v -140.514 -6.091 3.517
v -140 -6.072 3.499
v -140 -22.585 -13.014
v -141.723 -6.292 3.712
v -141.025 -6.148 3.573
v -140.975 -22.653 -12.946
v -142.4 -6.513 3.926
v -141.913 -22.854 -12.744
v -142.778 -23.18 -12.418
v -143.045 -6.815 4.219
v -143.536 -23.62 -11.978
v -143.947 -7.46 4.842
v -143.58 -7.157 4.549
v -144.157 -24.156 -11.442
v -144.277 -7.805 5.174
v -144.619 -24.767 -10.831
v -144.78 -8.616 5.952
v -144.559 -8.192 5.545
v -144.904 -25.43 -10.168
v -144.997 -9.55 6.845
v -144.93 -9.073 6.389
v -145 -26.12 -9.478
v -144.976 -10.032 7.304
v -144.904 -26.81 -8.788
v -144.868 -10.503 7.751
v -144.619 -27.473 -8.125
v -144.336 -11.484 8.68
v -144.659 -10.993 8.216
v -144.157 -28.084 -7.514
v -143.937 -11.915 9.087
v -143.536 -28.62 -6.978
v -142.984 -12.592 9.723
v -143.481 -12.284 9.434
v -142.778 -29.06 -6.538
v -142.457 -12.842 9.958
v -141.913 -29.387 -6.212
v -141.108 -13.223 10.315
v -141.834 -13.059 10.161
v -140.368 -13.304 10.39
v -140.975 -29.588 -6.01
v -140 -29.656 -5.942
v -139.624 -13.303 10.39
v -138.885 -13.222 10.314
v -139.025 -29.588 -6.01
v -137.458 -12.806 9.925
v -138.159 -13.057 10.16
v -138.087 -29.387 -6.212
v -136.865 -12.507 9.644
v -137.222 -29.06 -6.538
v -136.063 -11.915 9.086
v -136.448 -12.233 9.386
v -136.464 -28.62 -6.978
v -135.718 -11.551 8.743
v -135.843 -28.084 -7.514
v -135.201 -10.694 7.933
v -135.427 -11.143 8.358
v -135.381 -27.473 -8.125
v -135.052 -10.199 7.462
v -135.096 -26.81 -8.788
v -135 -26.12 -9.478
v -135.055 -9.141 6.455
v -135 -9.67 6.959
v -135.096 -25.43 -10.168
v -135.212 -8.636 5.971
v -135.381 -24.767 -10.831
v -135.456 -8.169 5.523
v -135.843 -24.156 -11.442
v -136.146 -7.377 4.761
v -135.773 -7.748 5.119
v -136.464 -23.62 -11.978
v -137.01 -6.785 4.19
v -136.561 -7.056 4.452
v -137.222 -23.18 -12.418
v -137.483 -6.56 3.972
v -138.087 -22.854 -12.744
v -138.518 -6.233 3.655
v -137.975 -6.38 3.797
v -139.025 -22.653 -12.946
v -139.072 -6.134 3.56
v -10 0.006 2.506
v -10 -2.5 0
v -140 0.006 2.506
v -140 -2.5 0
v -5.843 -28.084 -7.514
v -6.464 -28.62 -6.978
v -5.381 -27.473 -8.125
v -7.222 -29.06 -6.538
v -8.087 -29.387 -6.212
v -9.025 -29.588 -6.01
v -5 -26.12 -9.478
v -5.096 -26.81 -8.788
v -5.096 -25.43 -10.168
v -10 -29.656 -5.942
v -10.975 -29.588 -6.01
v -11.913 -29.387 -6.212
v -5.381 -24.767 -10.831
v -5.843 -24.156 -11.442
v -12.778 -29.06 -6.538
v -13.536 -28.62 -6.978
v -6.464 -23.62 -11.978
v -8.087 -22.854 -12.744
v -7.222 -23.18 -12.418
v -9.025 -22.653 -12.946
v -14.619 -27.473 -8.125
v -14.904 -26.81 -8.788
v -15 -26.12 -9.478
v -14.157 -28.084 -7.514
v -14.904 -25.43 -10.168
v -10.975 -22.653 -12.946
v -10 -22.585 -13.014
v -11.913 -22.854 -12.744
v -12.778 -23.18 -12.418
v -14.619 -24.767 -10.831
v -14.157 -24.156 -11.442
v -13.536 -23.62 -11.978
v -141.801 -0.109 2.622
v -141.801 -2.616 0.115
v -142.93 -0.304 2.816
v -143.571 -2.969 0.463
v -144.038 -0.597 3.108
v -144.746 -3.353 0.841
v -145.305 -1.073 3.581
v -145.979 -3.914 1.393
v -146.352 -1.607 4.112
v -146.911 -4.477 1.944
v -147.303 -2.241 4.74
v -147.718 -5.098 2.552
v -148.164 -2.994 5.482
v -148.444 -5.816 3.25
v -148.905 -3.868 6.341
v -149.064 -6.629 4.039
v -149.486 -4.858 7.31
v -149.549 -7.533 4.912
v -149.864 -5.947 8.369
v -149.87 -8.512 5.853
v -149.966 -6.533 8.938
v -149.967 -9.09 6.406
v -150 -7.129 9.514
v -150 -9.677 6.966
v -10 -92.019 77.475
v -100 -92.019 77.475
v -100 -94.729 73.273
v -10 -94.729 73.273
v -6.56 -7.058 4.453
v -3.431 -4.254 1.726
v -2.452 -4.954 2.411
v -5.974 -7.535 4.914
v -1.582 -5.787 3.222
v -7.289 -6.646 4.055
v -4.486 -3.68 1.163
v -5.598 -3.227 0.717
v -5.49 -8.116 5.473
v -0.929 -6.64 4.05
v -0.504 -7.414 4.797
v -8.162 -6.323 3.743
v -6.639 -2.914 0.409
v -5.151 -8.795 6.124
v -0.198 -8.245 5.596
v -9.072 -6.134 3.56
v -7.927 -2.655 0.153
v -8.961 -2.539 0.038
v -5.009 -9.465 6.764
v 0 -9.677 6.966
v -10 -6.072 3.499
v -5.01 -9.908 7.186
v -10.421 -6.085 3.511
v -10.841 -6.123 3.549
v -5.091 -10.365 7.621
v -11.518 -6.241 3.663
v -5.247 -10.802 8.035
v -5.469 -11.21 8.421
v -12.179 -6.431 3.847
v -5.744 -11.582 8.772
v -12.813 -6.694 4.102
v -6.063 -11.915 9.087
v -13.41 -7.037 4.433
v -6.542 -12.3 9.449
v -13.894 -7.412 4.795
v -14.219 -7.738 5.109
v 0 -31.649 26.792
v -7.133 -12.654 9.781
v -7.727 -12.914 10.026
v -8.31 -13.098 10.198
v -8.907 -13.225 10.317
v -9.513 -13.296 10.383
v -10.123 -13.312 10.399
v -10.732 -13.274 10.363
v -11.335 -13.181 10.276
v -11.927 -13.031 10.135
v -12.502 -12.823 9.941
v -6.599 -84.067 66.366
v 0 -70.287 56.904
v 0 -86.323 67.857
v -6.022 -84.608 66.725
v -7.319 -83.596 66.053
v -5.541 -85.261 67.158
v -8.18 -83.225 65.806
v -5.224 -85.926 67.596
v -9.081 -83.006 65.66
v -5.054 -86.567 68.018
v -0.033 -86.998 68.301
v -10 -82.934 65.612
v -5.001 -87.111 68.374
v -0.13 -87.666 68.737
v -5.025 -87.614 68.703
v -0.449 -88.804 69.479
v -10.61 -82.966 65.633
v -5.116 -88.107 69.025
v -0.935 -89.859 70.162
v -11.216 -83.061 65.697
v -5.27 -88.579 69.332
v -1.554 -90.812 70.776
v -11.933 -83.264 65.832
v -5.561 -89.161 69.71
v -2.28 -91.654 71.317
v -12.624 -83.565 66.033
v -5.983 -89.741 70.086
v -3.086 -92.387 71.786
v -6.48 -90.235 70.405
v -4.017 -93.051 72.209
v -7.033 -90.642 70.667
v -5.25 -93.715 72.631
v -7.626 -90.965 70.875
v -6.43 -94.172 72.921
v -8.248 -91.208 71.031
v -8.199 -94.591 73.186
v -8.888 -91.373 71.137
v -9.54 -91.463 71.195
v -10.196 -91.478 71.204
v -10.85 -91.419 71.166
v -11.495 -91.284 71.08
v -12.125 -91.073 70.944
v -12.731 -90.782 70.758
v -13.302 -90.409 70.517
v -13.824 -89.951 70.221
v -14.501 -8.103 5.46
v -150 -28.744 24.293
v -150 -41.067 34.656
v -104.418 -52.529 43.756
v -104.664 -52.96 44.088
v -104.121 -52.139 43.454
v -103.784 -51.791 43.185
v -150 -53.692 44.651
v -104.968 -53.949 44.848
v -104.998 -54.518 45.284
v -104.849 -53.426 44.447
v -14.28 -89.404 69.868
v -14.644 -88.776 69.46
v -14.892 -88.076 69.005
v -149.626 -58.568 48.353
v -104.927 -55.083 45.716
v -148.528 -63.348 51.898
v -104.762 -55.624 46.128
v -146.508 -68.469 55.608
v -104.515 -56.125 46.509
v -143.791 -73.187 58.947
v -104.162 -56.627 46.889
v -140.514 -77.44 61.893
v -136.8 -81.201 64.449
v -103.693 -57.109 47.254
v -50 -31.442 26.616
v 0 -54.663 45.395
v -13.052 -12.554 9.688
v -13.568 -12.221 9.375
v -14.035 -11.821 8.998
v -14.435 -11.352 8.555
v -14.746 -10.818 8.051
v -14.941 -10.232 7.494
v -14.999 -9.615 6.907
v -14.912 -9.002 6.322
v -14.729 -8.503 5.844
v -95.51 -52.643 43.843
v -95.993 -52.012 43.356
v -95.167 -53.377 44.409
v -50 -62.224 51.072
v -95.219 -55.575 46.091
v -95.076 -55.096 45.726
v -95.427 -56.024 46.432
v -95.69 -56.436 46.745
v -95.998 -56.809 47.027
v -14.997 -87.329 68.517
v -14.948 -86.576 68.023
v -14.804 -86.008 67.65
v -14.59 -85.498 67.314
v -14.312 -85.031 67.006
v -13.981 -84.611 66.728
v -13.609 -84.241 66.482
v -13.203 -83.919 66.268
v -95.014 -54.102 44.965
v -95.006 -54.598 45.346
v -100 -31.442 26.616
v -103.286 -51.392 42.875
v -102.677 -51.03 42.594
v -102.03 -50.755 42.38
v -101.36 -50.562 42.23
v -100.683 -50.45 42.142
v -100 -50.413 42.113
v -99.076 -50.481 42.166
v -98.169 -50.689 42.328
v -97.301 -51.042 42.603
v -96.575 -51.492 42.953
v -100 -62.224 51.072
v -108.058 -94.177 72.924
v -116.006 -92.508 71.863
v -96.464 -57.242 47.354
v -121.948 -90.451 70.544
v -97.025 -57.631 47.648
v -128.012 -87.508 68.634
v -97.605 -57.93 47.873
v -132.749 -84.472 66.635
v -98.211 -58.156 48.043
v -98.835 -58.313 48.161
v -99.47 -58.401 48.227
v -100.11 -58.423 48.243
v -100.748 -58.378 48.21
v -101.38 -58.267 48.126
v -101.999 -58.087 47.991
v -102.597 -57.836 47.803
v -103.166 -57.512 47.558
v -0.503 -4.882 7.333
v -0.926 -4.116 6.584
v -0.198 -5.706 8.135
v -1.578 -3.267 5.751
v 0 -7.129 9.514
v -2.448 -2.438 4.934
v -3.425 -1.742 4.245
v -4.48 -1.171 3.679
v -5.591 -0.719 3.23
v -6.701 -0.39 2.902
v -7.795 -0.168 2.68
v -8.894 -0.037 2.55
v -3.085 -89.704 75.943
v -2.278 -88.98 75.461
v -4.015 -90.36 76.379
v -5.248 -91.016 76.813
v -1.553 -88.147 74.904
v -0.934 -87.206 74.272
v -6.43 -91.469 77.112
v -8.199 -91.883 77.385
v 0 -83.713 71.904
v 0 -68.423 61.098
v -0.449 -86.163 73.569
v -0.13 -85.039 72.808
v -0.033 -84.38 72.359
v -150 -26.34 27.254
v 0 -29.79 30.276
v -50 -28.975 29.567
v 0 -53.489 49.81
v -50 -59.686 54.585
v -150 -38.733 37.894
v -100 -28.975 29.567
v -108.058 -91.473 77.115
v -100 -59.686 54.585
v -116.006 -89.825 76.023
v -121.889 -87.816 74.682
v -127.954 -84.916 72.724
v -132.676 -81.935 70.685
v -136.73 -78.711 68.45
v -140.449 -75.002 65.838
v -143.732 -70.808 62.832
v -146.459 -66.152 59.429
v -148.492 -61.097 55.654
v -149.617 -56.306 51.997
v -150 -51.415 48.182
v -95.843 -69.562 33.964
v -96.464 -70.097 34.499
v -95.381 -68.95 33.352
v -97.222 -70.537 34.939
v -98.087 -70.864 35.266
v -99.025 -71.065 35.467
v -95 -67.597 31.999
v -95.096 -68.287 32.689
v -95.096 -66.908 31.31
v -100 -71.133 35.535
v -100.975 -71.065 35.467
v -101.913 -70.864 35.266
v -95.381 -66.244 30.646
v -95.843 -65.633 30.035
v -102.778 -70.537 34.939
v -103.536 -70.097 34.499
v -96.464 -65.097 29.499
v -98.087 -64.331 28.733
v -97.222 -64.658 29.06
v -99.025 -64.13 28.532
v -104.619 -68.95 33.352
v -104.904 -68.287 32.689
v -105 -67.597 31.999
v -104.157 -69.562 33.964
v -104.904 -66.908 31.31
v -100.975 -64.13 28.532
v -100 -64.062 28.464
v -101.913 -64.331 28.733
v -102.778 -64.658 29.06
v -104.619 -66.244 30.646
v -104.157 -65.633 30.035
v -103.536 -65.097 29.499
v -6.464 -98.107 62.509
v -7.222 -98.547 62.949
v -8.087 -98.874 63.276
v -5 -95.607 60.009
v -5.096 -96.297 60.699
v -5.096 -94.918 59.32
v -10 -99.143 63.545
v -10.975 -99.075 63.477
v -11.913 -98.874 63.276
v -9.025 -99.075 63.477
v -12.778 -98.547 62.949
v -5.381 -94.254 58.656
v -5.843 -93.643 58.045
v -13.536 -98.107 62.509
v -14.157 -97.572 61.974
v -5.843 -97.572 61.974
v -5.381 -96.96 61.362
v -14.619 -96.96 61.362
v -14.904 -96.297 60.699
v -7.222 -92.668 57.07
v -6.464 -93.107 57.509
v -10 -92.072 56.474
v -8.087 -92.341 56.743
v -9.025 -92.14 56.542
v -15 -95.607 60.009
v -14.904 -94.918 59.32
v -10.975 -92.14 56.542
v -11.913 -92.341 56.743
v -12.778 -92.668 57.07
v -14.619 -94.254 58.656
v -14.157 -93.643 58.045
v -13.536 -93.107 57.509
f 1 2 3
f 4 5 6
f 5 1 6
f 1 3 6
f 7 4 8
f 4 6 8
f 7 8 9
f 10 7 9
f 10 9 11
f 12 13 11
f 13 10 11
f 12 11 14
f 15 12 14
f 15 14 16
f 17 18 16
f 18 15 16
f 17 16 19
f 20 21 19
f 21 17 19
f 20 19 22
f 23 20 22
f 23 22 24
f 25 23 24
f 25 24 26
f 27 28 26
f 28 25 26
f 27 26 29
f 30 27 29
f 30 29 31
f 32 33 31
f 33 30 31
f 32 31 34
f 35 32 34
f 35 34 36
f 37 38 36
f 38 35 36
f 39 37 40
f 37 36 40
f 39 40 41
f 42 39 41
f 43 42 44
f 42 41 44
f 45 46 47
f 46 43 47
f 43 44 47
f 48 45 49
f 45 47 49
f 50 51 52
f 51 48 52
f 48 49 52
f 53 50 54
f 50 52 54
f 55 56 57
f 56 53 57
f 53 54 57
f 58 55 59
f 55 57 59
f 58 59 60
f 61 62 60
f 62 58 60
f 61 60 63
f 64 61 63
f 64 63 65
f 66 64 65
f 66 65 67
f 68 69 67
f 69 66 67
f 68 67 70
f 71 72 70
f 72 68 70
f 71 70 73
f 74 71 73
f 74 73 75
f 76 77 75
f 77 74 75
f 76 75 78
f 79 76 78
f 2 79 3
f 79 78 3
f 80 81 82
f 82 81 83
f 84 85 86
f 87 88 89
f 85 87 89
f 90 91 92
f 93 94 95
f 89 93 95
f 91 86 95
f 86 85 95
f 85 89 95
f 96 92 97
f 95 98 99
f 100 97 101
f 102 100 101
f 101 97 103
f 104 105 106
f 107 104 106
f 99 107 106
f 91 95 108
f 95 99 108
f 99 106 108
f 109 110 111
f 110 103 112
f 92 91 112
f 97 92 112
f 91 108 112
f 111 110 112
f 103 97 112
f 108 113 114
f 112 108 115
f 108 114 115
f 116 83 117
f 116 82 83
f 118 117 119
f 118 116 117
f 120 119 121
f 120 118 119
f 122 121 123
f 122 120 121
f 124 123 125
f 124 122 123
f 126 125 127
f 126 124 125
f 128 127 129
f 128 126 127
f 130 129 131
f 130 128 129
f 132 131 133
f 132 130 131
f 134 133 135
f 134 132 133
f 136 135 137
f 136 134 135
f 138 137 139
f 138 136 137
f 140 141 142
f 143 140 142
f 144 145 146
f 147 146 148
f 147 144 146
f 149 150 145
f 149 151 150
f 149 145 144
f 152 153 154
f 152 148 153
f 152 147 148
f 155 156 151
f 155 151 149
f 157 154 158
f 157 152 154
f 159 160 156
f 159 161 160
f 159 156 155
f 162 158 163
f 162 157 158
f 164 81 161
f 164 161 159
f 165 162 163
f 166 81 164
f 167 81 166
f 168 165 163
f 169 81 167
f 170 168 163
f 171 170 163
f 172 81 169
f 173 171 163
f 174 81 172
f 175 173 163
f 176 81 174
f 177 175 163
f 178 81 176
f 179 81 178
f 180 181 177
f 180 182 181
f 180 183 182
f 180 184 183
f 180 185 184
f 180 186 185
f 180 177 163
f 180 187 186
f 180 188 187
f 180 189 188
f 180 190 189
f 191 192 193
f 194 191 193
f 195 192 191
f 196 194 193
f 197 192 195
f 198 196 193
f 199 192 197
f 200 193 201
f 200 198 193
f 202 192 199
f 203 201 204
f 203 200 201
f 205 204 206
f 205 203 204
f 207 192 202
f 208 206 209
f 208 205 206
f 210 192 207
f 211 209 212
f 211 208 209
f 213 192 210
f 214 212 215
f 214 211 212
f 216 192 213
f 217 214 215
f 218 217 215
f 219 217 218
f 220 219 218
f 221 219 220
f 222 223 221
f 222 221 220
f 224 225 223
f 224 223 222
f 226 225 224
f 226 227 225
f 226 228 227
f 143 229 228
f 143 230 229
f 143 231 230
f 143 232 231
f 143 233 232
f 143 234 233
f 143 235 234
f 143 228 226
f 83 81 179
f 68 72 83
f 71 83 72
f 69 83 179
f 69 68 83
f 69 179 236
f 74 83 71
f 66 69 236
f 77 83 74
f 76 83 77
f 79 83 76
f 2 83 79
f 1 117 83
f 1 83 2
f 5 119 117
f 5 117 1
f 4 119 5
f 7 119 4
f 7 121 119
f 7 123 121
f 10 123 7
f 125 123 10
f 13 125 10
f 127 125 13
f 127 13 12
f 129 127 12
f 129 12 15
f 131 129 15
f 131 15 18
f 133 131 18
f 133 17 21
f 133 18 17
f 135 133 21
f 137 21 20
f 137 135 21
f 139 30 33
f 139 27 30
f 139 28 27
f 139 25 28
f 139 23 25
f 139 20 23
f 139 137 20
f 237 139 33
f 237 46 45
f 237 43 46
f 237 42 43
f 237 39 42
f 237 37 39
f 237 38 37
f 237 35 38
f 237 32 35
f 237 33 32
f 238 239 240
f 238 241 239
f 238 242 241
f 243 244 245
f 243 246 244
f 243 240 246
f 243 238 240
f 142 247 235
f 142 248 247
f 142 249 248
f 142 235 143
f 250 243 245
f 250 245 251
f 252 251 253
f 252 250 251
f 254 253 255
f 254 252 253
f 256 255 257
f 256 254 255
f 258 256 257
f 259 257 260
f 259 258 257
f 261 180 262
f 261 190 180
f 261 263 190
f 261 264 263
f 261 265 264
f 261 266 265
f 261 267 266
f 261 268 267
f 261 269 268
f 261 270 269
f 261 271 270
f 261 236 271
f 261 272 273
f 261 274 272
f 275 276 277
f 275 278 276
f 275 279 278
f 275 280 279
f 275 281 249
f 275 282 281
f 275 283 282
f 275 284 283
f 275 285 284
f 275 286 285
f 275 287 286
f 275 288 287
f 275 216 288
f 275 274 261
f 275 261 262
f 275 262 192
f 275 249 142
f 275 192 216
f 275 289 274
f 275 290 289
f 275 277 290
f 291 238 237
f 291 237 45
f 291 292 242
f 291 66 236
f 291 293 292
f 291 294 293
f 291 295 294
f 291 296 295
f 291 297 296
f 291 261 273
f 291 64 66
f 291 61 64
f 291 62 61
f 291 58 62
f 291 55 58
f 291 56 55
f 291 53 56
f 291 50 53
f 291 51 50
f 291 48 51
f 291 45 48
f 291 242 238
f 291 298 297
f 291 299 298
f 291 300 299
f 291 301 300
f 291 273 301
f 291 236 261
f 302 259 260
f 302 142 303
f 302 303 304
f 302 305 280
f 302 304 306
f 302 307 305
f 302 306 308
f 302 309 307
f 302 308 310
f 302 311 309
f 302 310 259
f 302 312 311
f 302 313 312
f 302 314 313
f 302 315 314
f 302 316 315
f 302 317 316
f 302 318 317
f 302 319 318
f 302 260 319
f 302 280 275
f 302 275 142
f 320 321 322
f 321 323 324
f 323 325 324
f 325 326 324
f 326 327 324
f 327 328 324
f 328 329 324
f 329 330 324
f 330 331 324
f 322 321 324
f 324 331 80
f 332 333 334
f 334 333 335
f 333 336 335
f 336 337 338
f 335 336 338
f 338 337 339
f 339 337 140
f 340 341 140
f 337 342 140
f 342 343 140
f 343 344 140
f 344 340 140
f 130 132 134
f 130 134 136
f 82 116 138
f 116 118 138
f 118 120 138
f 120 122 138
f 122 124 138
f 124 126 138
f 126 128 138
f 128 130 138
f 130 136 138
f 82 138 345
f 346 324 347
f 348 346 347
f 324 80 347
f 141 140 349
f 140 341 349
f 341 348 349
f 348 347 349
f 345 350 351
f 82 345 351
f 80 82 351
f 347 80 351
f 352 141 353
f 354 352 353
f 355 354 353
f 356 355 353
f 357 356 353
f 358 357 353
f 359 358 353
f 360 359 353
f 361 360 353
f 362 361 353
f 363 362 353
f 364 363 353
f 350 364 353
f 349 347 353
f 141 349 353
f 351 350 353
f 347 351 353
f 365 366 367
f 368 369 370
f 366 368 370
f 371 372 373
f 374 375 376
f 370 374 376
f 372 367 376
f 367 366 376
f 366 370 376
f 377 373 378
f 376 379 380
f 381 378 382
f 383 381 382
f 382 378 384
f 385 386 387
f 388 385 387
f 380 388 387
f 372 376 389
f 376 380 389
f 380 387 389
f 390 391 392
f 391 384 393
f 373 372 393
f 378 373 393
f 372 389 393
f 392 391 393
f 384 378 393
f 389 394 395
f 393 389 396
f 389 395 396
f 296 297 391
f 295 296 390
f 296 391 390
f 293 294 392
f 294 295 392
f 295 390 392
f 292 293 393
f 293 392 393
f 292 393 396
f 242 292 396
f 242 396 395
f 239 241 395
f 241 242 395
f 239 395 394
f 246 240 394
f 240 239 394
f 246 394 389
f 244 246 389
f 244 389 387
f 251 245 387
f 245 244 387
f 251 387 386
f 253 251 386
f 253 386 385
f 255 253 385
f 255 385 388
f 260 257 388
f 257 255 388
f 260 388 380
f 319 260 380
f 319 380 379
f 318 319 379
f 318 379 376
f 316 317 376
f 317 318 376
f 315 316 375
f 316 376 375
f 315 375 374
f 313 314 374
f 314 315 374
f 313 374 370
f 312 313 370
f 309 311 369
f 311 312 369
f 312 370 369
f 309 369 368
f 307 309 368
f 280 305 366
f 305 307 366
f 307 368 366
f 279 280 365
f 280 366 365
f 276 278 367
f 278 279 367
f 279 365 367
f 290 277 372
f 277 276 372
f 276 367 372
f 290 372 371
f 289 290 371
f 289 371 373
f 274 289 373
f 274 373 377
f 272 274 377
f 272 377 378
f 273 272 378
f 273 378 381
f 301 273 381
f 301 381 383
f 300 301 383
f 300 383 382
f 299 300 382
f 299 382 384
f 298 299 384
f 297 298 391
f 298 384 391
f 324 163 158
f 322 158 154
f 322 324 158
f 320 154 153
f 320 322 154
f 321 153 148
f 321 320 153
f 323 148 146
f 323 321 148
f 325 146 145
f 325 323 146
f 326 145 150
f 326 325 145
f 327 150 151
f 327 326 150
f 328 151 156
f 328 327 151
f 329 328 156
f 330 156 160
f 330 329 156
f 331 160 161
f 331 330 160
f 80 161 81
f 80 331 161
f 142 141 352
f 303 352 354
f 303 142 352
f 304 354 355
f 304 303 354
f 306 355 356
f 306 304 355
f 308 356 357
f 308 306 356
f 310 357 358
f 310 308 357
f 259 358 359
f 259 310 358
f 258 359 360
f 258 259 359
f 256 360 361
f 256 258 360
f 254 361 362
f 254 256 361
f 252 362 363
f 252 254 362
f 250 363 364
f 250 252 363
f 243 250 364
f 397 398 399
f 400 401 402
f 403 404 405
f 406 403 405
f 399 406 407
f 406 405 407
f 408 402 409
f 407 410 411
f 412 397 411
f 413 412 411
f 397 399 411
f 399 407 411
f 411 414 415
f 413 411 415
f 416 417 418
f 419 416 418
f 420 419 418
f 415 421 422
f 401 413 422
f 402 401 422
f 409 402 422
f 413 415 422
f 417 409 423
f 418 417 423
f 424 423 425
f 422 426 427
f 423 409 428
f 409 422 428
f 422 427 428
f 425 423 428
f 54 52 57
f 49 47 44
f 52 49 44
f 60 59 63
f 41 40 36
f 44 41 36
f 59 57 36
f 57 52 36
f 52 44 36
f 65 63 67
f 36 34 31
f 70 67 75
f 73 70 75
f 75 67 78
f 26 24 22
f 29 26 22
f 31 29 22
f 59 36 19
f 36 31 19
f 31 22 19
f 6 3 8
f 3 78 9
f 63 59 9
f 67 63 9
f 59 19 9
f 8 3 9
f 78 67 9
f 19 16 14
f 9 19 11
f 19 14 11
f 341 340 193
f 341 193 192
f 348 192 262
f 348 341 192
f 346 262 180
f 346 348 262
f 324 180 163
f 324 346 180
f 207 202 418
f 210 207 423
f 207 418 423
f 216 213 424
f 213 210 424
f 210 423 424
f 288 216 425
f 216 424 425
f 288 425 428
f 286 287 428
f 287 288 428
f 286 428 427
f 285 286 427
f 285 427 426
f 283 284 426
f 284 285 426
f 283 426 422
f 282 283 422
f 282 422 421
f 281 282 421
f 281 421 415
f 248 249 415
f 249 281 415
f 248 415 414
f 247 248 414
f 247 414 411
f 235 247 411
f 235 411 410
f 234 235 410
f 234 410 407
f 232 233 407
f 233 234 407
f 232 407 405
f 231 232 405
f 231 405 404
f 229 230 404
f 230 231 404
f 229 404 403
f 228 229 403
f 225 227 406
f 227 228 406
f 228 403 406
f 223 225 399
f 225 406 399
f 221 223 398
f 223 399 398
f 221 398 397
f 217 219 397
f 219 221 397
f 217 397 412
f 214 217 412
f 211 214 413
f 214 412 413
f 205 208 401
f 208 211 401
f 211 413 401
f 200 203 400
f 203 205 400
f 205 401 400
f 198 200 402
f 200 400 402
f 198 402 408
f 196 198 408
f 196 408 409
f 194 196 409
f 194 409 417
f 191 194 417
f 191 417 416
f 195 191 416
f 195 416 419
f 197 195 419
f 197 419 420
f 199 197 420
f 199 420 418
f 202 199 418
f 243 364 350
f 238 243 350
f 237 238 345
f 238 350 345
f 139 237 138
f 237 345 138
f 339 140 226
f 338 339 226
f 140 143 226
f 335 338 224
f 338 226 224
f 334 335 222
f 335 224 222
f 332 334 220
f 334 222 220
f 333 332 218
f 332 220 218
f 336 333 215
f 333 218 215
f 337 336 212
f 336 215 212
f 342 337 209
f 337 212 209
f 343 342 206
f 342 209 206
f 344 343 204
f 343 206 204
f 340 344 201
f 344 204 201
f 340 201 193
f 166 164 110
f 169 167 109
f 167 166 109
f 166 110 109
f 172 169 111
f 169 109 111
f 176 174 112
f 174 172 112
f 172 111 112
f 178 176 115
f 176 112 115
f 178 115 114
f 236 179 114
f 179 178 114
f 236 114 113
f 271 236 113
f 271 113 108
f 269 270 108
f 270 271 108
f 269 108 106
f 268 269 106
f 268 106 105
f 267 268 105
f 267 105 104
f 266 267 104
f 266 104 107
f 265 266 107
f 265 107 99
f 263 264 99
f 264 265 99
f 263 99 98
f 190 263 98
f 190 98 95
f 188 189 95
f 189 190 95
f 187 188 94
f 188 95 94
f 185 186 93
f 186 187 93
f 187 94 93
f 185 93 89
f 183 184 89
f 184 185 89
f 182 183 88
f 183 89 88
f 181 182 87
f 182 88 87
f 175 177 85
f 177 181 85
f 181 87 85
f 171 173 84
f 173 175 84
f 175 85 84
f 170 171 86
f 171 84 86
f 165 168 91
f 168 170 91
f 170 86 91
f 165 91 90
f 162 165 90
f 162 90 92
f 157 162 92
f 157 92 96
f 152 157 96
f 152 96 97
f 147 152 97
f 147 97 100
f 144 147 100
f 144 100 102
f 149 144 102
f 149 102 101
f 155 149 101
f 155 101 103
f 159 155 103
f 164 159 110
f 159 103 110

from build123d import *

# Parameters (mm, degrees)
LOFT_START          = -150
LOFT_18_DEPTH       = 150
FILLET_1_R          = 50
SKETCH_8_W          = 150
SKETCH_8_H          = 89.90044461
CUT_EXTRUDE_3_DEPTH = 194.637322649
FILLET_3_R          = 10
EXTRUDE_1_REACH     = 195.637
SKETCH_5_R          = 5


# Read off the part's stored shape, not the designer's step: 放样18
with BuildPart() as part:
    # 放样18 outline → 放样18 (new body)
    with BuildSketch(Plane.YZ.offset(LOFT_START)):
        with BuildLine():
            Line((-92.019059125, 77.475043518), (-94.7292742, 73.273289807))
            add(Edge.make_bspline(
                [(-2.5, 0), (-30.482362978, 27.663701514), (-61.402130233, 52.230749004), (-94.7292742, 73.273289807)],
                knots=[0, 0, 0, 0, 1, 1, 1, 1], degree=3))
            Line((-2.5, 0), (2.5, 0))
            add(Edge.make_bspline(
                [(2.5, 0), (-26.24562462, 29.064286084), (-57.928653516, 55.031918144), (-92.019059125, 77.475043518)],
                knots=[0, 0, 0, 0, 1, 1, 1, 1], degree=3))
        make_face()
    extrude(amount=LOFT_18_DEPTH)

    # 圆角1
    fillet_1_edges = [part.edges().sort_by_distance(p)[0] for p in [
        (-150, -93.374166663, 75.374166663),
    ]]
    fillet(fillet_1_edges, radius=FILLET_1_R)

    # 草图8 → 切除-拉伸3 (cut, through all)
    with BuildSketch(Plane(origin=(0, -17.799060008, -17.799060008), x_dir=(-1, 0, 0), z_dir=(0, 0.7071067811865488, 0.7071067811865464))):
        with Locations((75, -43.182455352)):
            Rectangle(SKETCH_8_W, SKETCH_8_H)
    extrude(amount=CUT_EXTRUDE_3_DEPTH, mode=Mode.SUBTRACT)

    # 圆角3
    fillet_3_edges = [part.edges().sort_by_distance(p)[0] for p in [
        (0, -93.374166663, 75.374166663),
        (0, -1.246870677, 1.253129323),
        (-150, -1.246870677, 1.253129323),
    ]]
    fillet(fillet_3_edges, radius=FILLET_3_R)

    # 草图5 → 凸台-拉伸1 (add, up to next)
    with BuildSketch(Plane(origin=(0, -17.799060008, -17.799060008), x_dir=(-1, 0, 0), z_dir=(0, 0.7071067811865488, 0.7071067811865464)), mode=Mode.PRIVATE) as extrude_1_sk1:
        with Locations(Location((140, 11.767766953, 0), (0, 0, 270))):
            Circle(SKETCH_5_R)
    extrude_1_tool1 = extrude(extrude_1_sk1.sketch, amount=EXTRUDE_1_REACH, mode=Mode.PRIVATE) - part.part
    # 草图5 → 凸台-拉伸1 (add, up to next)
    with BuildSketch(Plane(origin=(0, -17.799060008, -17.799060008), x_dir=(-1, 0, 0), z_dir=(0, 0.7071067811865488, 0.7071067811865464)), mode=Mode.PRIVATE) as extrude_1_sk2:
        with Locations(Location((10, 11.767766953, 0), (0, 0, 270))):
            Circle(SKETCH_5_R)
    extrude_1_tool2 = extrude(extrude_1_sk2.sketch, amount=EXTRUDE_1_REACH, mode=Mode.PRIVATE) - part.part
    # 草图5 → 凸台-拉伸1 (add, up to next)
    with BuildSketch(Plane(origin=(0, -17.799060008, -17.799060008), x_dir=(-1, 0, 0), z_dir=(0, 0.7071067811865488, 0.7071067811865464)), mode=Mode.PRIVATE) as extrude_1_sk3:
        with Locations(Location((10, 110.037688609, 0), (0, 0, 270))):
            Circle(SKETCH_5_R)
    extrude_1_tool3 = extrude(extrude_1_sk3.sketch, amount=EXTRUDE_1_REACH, mode=Mode.PRIVATE) - part.part
    # 草图5 → 凸台-拉伸1 (add, up to next)
    with BuildSketch(Plane(origin=(0, -17.799060008, -17.799060008), x_dir=(-1, 0, 0), z_dir=(0, 0.7071067811865488, 0.7071067811865464)), mode=Mode.PRIVATE) as extrude_1_sk4:
        with Locations(Location((100, 70.425532461, 0), (0, 0, 270))):
            Circle(SKETCH_5_R)
    extrude_1_tool4 = extrude(extrude_1_sk4.sketch, amount=EXTRUDE_1_REACH, mode=Mode.PRIVATE) - part.part
    add(extrude_1_tool1.solids().sort_by_distance((-140, -26.120128, -9.477992))[0])
    add(extrude_1_tool2.solids().sort_by_distance((-10, -26.120128, -9.477992))[0])
    add(extrude_1_tool3.solids().sort_by_distance((-10, -95.607456, 60.009336))[0])
    add(extrude_1_tool4.solids().sort_by_distance((-100, -67.597432, 31.999312))[0])


solid = part.part
